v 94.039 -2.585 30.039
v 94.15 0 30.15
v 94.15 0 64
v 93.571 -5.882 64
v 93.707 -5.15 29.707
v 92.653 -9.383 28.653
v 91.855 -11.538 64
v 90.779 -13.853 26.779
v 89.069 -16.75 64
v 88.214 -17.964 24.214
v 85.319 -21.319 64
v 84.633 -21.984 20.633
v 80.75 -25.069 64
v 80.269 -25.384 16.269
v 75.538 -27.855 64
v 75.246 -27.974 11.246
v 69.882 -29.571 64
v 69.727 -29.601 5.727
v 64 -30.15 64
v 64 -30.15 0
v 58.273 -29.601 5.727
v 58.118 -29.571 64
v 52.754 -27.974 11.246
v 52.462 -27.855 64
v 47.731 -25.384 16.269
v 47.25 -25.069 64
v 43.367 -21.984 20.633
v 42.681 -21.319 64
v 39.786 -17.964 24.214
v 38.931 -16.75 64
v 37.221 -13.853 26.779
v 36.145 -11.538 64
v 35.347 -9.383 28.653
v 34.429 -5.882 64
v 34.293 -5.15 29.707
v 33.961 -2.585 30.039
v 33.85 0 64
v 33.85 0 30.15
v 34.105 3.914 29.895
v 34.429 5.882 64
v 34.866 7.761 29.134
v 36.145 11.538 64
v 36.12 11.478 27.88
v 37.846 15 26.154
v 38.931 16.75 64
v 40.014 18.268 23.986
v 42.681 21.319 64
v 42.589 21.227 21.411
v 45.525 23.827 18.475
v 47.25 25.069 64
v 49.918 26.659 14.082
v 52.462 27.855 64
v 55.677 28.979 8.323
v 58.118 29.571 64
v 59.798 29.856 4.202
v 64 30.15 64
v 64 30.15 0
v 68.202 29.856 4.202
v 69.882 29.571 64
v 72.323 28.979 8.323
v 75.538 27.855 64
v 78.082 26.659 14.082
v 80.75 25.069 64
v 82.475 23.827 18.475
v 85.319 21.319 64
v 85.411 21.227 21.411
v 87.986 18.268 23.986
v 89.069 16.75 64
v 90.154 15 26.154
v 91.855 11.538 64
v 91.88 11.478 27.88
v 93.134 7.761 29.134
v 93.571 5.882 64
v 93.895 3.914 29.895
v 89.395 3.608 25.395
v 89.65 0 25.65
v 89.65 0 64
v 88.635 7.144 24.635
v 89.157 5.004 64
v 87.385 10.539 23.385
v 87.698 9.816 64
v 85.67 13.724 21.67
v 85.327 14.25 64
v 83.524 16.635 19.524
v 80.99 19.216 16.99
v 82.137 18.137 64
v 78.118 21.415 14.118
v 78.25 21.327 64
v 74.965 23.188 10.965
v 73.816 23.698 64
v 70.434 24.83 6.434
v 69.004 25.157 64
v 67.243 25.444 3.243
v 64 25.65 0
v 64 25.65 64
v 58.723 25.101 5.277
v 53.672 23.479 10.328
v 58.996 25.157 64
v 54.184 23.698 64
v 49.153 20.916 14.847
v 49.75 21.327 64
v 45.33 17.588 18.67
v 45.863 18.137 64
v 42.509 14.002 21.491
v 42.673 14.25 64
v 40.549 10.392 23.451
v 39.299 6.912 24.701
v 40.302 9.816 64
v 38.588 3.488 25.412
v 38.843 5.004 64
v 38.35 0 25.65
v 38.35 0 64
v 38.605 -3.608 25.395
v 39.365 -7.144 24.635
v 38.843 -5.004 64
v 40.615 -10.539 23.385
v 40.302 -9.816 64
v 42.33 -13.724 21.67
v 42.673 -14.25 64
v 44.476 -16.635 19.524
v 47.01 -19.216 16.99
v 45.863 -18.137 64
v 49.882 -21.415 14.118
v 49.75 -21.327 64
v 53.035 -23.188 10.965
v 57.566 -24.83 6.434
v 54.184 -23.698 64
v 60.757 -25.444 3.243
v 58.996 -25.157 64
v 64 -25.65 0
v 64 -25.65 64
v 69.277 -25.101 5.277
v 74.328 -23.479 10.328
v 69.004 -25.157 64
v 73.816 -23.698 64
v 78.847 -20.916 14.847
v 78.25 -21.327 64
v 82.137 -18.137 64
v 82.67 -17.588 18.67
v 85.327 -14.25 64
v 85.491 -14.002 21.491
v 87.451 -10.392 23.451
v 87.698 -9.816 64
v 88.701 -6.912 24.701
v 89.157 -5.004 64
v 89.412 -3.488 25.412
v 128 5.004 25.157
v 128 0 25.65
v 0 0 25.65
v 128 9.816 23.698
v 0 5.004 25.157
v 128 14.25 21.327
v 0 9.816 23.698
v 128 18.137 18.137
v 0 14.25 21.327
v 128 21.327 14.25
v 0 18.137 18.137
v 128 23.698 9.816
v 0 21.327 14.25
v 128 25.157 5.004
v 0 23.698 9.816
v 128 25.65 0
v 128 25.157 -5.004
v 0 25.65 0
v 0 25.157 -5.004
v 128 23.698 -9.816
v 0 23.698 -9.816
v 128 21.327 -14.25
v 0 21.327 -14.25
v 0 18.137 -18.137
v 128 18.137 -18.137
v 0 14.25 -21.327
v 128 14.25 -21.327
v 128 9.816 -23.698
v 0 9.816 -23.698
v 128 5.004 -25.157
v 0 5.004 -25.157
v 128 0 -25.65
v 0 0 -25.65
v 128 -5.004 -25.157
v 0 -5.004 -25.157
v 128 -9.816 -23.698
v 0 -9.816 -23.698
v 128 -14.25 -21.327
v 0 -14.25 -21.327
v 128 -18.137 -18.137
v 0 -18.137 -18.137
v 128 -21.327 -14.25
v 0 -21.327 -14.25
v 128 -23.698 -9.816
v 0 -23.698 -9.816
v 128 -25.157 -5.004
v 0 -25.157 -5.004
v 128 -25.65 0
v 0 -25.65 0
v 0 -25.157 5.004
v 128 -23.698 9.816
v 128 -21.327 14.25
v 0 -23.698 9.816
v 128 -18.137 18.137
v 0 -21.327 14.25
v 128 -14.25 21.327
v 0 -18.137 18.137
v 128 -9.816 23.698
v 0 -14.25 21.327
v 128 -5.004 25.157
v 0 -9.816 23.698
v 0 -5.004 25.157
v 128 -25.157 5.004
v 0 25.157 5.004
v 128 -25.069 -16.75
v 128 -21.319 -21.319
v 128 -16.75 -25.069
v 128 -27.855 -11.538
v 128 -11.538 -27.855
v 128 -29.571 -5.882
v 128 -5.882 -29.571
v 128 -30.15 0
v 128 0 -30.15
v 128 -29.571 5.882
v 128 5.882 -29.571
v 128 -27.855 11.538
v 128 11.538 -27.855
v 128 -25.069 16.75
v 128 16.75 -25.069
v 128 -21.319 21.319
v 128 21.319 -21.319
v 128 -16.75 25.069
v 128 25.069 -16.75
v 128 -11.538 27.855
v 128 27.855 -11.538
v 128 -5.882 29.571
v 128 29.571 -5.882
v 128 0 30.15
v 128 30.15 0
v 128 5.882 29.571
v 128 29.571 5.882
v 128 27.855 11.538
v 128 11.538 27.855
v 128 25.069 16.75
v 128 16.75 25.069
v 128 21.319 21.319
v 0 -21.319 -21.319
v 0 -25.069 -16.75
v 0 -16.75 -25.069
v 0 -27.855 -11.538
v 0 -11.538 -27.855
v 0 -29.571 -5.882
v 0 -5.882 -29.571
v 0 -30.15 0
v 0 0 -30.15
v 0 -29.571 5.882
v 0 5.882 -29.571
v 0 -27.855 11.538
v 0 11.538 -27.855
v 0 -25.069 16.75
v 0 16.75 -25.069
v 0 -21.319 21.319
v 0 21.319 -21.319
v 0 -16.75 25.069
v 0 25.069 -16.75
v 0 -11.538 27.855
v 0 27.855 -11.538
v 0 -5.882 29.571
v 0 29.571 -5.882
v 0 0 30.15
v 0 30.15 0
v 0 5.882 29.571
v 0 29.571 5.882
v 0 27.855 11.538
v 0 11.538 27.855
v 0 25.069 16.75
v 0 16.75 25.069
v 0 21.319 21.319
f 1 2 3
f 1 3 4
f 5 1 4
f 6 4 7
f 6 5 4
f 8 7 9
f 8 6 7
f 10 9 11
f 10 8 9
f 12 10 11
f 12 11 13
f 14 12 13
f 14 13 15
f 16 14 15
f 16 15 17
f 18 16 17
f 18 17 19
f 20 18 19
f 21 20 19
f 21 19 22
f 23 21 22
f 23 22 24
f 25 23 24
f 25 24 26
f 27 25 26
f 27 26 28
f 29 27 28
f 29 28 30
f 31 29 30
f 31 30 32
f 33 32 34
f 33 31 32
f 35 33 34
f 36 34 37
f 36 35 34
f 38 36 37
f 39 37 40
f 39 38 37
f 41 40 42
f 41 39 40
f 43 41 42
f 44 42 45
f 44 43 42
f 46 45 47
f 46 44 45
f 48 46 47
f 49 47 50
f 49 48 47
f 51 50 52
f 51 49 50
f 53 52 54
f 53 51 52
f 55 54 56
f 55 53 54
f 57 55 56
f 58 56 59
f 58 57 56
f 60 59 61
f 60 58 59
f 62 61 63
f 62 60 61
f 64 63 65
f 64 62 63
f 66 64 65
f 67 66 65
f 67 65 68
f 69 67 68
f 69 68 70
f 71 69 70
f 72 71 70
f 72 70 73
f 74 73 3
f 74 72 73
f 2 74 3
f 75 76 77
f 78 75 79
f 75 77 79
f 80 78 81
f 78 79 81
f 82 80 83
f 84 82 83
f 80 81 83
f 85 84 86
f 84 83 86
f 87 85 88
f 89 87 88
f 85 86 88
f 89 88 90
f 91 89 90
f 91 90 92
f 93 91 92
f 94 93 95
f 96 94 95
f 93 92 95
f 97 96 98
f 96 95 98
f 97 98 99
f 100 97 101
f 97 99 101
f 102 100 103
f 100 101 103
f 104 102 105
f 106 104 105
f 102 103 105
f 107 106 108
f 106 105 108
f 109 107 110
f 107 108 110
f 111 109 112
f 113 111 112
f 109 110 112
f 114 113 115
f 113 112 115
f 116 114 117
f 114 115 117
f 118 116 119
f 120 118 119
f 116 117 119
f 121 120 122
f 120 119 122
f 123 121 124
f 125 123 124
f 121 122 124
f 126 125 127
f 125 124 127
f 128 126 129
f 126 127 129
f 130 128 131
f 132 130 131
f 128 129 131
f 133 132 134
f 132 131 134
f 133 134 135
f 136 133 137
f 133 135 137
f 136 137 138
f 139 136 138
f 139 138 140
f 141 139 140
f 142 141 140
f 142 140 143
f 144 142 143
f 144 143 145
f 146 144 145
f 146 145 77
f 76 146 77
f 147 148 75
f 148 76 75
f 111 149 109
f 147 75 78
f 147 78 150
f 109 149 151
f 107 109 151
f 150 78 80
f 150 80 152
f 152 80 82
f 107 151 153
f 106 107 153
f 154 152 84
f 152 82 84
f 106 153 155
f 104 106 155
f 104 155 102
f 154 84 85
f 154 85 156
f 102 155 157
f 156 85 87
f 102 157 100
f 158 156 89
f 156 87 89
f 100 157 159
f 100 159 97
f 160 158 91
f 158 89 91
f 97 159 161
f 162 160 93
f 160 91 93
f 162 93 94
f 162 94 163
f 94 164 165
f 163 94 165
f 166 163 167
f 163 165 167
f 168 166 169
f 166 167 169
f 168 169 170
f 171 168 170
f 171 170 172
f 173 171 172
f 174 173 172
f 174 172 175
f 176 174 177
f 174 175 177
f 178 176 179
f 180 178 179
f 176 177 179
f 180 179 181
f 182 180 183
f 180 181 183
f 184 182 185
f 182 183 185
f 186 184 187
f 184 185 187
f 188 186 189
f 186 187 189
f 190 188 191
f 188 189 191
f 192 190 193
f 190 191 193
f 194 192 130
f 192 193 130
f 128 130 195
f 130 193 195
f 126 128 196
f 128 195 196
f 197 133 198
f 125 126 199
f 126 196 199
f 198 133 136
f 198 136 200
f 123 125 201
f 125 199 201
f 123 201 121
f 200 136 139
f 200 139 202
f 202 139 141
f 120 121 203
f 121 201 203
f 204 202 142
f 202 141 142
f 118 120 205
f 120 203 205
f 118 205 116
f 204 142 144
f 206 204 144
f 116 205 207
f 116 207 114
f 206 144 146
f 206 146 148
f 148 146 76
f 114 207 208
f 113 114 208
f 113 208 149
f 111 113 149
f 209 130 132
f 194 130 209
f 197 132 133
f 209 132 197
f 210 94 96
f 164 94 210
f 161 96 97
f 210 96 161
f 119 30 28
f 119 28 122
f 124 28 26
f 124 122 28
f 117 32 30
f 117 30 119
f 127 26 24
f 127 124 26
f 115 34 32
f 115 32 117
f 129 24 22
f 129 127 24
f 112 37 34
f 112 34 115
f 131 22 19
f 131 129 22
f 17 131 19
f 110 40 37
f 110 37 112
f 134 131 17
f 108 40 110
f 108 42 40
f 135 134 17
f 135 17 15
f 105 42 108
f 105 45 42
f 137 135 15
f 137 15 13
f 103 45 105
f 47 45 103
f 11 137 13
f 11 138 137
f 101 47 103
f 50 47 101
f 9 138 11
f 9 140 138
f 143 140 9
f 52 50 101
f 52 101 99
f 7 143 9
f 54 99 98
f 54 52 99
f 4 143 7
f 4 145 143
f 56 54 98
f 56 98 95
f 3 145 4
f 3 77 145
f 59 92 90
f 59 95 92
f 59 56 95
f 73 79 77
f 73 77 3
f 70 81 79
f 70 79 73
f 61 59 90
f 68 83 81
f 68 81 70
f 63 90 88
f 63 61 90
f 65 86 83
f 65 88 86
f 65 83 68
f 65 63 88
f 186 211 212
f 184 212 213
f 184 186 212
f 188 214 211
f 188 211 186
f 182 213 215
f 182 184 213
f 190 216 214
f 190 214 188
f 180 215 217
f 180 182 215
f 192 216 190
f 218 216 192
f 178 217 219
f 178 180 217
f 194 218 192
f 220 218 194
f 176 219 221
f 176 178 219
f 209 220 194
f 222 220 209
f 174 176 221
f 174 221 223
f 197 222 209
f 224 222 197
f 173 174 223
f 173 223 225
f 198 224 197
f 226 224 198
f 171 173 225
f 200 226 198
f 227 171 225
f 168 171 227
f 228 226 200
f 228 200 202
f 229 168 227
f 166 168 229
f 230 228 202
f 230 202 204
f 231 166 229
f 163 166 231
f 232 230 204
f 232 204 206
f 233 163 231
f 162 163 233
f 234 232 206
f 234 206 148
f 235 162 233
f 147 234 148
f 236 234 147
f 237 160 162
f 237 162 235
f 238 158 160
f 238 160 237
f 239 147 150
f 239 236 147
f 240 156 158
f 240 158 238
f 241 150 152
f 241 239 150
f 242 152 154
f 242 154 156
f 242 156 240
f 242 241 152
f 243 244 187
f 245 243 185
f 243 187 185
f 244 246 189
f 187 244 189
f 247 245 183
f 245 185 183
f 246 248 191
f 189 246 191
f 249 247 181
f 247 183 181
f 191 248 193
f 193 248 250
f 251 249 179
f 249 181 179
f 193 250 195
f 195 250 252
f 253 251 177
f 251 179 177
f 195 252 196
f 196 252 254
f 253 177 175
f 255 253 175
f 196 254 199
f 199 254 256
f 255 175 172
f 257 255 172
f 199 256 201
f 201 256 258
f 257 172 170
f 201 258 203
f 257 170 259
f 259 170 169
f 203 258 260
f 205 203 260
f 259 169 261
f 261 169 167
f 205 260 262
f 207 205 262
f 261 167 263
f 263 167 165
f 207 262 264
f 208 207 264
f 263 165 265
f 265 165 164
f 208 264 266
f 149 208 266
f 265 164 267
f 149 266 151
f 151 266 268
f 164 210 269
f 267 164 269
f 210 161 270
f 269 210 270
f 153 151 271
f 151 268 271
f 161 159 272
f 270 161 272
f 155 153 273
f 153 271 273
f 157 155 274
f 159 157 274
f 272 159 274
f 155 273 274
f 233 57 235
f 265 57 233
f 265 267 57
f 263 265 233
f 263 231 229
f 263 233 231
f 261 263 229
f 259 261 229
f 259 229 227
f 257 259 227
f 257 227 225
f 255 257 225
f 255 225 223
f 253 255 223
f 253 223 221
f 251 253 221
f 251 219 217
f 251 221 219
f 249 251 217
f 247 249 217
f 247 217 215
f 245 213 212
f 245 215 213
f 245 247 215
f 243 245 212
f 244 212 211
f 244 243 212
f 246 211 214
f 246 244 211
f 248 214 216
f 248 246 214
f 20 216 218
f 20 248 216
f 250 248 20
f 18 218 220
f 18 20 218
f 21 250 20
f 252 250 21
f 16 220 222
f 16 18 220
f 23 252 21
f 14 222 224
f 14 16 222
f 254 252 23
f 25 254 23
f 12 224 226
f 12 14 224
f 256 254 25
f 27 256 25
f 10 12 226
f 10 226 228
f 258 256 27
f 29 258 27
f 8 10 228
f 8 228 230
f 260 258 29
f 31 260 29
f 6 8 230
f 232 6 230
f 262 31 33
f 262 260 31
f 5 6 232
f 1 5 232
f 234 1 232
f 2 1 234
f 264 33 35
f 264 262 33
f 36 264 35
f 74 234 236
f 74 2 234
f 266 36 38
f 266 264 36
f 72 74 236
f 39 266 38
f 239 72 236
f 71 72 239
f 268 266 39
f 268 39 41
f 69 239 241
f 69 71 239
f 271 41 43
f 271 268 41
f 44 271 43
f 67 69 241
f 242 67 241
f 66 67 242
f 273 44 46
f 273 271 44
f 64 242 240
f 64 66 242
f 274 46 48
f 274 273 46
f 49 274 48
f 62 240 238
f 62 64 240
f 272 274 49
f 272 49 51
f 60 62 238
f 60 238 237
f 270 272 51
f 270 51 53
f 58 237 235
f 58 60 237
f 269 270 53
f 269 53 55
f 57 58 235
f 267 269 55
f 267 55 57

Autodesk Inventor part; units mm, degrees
ref_plane "YZ Plane" through (0, 0, 0) normal (1, 0, 0) x (0, 1, 0)
ref_plane "XZ Plane" through (0, 0, 0) normal (0, 1, 0) x (-1, 0, 0)
ref_plane "XY Plane" through (0, 0, 0) normal (0, 0, 1) x (1, 0, 0)
sketch "Sketch1" plane through (0, 0, 0) normal (1, 0, 0) x (0, 1, 0)
  circle A0 centre (0, 0) radius 30.15
  dimension "d0" = 60.3
extrude "Extrude1" add sketch "Sketch1" along normal blind 128
sketch "Sketch2" plane through (0, 0, 0) normal (0, 0, 1) x (1, 0, 0)
  line L0 (0, 30.15) -> (0, -30.15) projected
  line L1 (128, 30.15) -> (128, -30.15) projected
  line L2 (0, 0) -> (128, 0) construction
  circle A0 centre (64, 0) radius 30.15
  dimension "d3" = 60.3
extrude "Extrude2" add sketch "Sketch2" along normal blind 64
sketch "Sketch3" plane through (0, 0, 0) normal (-1, 0, 0) x (0, 0, 1)
  circle A0 centre (0, 0) radius 30.15 projected
  circle A1 centre (0, 0) radius 25.65
  dimension "d6" = 51.3
extrude "Extrude3" cut sketch "Sketch3" against normal through all contours A1
sketch "Sketch4" plane through (64, 0, 64) normal (0, 0, 1) x (1, 0, 0)
  circle A0 centre (0, 0) radius 30.15 projected
  circle A1 centre (0, 0) radius 25.65
  dimension "d9" = 51.3
extrude "Extrude4" cut sketch "Sketch4" against normal up to next contours A1
equation "\"d0\" = d"
equation "\"d1\" = 2 * a"
equation "\"d3\" = d"
equation "\"d4\" = a"
equation "\"d6\" = d - 2 * s1"
equation "\"d7\" = a"
equation "\"d9\" = d - 2 * s1"
equation "\"d10\" = a"
equation "\"d\" = 60.3"
equation "\"s1\" = 4.5"
equation "\"a\" = 64"
equation "\"Size_Designation\" = 1.2345"
properties part number "DIN 2615-1 Tee 60.3 x 4 S" material "Steel"
